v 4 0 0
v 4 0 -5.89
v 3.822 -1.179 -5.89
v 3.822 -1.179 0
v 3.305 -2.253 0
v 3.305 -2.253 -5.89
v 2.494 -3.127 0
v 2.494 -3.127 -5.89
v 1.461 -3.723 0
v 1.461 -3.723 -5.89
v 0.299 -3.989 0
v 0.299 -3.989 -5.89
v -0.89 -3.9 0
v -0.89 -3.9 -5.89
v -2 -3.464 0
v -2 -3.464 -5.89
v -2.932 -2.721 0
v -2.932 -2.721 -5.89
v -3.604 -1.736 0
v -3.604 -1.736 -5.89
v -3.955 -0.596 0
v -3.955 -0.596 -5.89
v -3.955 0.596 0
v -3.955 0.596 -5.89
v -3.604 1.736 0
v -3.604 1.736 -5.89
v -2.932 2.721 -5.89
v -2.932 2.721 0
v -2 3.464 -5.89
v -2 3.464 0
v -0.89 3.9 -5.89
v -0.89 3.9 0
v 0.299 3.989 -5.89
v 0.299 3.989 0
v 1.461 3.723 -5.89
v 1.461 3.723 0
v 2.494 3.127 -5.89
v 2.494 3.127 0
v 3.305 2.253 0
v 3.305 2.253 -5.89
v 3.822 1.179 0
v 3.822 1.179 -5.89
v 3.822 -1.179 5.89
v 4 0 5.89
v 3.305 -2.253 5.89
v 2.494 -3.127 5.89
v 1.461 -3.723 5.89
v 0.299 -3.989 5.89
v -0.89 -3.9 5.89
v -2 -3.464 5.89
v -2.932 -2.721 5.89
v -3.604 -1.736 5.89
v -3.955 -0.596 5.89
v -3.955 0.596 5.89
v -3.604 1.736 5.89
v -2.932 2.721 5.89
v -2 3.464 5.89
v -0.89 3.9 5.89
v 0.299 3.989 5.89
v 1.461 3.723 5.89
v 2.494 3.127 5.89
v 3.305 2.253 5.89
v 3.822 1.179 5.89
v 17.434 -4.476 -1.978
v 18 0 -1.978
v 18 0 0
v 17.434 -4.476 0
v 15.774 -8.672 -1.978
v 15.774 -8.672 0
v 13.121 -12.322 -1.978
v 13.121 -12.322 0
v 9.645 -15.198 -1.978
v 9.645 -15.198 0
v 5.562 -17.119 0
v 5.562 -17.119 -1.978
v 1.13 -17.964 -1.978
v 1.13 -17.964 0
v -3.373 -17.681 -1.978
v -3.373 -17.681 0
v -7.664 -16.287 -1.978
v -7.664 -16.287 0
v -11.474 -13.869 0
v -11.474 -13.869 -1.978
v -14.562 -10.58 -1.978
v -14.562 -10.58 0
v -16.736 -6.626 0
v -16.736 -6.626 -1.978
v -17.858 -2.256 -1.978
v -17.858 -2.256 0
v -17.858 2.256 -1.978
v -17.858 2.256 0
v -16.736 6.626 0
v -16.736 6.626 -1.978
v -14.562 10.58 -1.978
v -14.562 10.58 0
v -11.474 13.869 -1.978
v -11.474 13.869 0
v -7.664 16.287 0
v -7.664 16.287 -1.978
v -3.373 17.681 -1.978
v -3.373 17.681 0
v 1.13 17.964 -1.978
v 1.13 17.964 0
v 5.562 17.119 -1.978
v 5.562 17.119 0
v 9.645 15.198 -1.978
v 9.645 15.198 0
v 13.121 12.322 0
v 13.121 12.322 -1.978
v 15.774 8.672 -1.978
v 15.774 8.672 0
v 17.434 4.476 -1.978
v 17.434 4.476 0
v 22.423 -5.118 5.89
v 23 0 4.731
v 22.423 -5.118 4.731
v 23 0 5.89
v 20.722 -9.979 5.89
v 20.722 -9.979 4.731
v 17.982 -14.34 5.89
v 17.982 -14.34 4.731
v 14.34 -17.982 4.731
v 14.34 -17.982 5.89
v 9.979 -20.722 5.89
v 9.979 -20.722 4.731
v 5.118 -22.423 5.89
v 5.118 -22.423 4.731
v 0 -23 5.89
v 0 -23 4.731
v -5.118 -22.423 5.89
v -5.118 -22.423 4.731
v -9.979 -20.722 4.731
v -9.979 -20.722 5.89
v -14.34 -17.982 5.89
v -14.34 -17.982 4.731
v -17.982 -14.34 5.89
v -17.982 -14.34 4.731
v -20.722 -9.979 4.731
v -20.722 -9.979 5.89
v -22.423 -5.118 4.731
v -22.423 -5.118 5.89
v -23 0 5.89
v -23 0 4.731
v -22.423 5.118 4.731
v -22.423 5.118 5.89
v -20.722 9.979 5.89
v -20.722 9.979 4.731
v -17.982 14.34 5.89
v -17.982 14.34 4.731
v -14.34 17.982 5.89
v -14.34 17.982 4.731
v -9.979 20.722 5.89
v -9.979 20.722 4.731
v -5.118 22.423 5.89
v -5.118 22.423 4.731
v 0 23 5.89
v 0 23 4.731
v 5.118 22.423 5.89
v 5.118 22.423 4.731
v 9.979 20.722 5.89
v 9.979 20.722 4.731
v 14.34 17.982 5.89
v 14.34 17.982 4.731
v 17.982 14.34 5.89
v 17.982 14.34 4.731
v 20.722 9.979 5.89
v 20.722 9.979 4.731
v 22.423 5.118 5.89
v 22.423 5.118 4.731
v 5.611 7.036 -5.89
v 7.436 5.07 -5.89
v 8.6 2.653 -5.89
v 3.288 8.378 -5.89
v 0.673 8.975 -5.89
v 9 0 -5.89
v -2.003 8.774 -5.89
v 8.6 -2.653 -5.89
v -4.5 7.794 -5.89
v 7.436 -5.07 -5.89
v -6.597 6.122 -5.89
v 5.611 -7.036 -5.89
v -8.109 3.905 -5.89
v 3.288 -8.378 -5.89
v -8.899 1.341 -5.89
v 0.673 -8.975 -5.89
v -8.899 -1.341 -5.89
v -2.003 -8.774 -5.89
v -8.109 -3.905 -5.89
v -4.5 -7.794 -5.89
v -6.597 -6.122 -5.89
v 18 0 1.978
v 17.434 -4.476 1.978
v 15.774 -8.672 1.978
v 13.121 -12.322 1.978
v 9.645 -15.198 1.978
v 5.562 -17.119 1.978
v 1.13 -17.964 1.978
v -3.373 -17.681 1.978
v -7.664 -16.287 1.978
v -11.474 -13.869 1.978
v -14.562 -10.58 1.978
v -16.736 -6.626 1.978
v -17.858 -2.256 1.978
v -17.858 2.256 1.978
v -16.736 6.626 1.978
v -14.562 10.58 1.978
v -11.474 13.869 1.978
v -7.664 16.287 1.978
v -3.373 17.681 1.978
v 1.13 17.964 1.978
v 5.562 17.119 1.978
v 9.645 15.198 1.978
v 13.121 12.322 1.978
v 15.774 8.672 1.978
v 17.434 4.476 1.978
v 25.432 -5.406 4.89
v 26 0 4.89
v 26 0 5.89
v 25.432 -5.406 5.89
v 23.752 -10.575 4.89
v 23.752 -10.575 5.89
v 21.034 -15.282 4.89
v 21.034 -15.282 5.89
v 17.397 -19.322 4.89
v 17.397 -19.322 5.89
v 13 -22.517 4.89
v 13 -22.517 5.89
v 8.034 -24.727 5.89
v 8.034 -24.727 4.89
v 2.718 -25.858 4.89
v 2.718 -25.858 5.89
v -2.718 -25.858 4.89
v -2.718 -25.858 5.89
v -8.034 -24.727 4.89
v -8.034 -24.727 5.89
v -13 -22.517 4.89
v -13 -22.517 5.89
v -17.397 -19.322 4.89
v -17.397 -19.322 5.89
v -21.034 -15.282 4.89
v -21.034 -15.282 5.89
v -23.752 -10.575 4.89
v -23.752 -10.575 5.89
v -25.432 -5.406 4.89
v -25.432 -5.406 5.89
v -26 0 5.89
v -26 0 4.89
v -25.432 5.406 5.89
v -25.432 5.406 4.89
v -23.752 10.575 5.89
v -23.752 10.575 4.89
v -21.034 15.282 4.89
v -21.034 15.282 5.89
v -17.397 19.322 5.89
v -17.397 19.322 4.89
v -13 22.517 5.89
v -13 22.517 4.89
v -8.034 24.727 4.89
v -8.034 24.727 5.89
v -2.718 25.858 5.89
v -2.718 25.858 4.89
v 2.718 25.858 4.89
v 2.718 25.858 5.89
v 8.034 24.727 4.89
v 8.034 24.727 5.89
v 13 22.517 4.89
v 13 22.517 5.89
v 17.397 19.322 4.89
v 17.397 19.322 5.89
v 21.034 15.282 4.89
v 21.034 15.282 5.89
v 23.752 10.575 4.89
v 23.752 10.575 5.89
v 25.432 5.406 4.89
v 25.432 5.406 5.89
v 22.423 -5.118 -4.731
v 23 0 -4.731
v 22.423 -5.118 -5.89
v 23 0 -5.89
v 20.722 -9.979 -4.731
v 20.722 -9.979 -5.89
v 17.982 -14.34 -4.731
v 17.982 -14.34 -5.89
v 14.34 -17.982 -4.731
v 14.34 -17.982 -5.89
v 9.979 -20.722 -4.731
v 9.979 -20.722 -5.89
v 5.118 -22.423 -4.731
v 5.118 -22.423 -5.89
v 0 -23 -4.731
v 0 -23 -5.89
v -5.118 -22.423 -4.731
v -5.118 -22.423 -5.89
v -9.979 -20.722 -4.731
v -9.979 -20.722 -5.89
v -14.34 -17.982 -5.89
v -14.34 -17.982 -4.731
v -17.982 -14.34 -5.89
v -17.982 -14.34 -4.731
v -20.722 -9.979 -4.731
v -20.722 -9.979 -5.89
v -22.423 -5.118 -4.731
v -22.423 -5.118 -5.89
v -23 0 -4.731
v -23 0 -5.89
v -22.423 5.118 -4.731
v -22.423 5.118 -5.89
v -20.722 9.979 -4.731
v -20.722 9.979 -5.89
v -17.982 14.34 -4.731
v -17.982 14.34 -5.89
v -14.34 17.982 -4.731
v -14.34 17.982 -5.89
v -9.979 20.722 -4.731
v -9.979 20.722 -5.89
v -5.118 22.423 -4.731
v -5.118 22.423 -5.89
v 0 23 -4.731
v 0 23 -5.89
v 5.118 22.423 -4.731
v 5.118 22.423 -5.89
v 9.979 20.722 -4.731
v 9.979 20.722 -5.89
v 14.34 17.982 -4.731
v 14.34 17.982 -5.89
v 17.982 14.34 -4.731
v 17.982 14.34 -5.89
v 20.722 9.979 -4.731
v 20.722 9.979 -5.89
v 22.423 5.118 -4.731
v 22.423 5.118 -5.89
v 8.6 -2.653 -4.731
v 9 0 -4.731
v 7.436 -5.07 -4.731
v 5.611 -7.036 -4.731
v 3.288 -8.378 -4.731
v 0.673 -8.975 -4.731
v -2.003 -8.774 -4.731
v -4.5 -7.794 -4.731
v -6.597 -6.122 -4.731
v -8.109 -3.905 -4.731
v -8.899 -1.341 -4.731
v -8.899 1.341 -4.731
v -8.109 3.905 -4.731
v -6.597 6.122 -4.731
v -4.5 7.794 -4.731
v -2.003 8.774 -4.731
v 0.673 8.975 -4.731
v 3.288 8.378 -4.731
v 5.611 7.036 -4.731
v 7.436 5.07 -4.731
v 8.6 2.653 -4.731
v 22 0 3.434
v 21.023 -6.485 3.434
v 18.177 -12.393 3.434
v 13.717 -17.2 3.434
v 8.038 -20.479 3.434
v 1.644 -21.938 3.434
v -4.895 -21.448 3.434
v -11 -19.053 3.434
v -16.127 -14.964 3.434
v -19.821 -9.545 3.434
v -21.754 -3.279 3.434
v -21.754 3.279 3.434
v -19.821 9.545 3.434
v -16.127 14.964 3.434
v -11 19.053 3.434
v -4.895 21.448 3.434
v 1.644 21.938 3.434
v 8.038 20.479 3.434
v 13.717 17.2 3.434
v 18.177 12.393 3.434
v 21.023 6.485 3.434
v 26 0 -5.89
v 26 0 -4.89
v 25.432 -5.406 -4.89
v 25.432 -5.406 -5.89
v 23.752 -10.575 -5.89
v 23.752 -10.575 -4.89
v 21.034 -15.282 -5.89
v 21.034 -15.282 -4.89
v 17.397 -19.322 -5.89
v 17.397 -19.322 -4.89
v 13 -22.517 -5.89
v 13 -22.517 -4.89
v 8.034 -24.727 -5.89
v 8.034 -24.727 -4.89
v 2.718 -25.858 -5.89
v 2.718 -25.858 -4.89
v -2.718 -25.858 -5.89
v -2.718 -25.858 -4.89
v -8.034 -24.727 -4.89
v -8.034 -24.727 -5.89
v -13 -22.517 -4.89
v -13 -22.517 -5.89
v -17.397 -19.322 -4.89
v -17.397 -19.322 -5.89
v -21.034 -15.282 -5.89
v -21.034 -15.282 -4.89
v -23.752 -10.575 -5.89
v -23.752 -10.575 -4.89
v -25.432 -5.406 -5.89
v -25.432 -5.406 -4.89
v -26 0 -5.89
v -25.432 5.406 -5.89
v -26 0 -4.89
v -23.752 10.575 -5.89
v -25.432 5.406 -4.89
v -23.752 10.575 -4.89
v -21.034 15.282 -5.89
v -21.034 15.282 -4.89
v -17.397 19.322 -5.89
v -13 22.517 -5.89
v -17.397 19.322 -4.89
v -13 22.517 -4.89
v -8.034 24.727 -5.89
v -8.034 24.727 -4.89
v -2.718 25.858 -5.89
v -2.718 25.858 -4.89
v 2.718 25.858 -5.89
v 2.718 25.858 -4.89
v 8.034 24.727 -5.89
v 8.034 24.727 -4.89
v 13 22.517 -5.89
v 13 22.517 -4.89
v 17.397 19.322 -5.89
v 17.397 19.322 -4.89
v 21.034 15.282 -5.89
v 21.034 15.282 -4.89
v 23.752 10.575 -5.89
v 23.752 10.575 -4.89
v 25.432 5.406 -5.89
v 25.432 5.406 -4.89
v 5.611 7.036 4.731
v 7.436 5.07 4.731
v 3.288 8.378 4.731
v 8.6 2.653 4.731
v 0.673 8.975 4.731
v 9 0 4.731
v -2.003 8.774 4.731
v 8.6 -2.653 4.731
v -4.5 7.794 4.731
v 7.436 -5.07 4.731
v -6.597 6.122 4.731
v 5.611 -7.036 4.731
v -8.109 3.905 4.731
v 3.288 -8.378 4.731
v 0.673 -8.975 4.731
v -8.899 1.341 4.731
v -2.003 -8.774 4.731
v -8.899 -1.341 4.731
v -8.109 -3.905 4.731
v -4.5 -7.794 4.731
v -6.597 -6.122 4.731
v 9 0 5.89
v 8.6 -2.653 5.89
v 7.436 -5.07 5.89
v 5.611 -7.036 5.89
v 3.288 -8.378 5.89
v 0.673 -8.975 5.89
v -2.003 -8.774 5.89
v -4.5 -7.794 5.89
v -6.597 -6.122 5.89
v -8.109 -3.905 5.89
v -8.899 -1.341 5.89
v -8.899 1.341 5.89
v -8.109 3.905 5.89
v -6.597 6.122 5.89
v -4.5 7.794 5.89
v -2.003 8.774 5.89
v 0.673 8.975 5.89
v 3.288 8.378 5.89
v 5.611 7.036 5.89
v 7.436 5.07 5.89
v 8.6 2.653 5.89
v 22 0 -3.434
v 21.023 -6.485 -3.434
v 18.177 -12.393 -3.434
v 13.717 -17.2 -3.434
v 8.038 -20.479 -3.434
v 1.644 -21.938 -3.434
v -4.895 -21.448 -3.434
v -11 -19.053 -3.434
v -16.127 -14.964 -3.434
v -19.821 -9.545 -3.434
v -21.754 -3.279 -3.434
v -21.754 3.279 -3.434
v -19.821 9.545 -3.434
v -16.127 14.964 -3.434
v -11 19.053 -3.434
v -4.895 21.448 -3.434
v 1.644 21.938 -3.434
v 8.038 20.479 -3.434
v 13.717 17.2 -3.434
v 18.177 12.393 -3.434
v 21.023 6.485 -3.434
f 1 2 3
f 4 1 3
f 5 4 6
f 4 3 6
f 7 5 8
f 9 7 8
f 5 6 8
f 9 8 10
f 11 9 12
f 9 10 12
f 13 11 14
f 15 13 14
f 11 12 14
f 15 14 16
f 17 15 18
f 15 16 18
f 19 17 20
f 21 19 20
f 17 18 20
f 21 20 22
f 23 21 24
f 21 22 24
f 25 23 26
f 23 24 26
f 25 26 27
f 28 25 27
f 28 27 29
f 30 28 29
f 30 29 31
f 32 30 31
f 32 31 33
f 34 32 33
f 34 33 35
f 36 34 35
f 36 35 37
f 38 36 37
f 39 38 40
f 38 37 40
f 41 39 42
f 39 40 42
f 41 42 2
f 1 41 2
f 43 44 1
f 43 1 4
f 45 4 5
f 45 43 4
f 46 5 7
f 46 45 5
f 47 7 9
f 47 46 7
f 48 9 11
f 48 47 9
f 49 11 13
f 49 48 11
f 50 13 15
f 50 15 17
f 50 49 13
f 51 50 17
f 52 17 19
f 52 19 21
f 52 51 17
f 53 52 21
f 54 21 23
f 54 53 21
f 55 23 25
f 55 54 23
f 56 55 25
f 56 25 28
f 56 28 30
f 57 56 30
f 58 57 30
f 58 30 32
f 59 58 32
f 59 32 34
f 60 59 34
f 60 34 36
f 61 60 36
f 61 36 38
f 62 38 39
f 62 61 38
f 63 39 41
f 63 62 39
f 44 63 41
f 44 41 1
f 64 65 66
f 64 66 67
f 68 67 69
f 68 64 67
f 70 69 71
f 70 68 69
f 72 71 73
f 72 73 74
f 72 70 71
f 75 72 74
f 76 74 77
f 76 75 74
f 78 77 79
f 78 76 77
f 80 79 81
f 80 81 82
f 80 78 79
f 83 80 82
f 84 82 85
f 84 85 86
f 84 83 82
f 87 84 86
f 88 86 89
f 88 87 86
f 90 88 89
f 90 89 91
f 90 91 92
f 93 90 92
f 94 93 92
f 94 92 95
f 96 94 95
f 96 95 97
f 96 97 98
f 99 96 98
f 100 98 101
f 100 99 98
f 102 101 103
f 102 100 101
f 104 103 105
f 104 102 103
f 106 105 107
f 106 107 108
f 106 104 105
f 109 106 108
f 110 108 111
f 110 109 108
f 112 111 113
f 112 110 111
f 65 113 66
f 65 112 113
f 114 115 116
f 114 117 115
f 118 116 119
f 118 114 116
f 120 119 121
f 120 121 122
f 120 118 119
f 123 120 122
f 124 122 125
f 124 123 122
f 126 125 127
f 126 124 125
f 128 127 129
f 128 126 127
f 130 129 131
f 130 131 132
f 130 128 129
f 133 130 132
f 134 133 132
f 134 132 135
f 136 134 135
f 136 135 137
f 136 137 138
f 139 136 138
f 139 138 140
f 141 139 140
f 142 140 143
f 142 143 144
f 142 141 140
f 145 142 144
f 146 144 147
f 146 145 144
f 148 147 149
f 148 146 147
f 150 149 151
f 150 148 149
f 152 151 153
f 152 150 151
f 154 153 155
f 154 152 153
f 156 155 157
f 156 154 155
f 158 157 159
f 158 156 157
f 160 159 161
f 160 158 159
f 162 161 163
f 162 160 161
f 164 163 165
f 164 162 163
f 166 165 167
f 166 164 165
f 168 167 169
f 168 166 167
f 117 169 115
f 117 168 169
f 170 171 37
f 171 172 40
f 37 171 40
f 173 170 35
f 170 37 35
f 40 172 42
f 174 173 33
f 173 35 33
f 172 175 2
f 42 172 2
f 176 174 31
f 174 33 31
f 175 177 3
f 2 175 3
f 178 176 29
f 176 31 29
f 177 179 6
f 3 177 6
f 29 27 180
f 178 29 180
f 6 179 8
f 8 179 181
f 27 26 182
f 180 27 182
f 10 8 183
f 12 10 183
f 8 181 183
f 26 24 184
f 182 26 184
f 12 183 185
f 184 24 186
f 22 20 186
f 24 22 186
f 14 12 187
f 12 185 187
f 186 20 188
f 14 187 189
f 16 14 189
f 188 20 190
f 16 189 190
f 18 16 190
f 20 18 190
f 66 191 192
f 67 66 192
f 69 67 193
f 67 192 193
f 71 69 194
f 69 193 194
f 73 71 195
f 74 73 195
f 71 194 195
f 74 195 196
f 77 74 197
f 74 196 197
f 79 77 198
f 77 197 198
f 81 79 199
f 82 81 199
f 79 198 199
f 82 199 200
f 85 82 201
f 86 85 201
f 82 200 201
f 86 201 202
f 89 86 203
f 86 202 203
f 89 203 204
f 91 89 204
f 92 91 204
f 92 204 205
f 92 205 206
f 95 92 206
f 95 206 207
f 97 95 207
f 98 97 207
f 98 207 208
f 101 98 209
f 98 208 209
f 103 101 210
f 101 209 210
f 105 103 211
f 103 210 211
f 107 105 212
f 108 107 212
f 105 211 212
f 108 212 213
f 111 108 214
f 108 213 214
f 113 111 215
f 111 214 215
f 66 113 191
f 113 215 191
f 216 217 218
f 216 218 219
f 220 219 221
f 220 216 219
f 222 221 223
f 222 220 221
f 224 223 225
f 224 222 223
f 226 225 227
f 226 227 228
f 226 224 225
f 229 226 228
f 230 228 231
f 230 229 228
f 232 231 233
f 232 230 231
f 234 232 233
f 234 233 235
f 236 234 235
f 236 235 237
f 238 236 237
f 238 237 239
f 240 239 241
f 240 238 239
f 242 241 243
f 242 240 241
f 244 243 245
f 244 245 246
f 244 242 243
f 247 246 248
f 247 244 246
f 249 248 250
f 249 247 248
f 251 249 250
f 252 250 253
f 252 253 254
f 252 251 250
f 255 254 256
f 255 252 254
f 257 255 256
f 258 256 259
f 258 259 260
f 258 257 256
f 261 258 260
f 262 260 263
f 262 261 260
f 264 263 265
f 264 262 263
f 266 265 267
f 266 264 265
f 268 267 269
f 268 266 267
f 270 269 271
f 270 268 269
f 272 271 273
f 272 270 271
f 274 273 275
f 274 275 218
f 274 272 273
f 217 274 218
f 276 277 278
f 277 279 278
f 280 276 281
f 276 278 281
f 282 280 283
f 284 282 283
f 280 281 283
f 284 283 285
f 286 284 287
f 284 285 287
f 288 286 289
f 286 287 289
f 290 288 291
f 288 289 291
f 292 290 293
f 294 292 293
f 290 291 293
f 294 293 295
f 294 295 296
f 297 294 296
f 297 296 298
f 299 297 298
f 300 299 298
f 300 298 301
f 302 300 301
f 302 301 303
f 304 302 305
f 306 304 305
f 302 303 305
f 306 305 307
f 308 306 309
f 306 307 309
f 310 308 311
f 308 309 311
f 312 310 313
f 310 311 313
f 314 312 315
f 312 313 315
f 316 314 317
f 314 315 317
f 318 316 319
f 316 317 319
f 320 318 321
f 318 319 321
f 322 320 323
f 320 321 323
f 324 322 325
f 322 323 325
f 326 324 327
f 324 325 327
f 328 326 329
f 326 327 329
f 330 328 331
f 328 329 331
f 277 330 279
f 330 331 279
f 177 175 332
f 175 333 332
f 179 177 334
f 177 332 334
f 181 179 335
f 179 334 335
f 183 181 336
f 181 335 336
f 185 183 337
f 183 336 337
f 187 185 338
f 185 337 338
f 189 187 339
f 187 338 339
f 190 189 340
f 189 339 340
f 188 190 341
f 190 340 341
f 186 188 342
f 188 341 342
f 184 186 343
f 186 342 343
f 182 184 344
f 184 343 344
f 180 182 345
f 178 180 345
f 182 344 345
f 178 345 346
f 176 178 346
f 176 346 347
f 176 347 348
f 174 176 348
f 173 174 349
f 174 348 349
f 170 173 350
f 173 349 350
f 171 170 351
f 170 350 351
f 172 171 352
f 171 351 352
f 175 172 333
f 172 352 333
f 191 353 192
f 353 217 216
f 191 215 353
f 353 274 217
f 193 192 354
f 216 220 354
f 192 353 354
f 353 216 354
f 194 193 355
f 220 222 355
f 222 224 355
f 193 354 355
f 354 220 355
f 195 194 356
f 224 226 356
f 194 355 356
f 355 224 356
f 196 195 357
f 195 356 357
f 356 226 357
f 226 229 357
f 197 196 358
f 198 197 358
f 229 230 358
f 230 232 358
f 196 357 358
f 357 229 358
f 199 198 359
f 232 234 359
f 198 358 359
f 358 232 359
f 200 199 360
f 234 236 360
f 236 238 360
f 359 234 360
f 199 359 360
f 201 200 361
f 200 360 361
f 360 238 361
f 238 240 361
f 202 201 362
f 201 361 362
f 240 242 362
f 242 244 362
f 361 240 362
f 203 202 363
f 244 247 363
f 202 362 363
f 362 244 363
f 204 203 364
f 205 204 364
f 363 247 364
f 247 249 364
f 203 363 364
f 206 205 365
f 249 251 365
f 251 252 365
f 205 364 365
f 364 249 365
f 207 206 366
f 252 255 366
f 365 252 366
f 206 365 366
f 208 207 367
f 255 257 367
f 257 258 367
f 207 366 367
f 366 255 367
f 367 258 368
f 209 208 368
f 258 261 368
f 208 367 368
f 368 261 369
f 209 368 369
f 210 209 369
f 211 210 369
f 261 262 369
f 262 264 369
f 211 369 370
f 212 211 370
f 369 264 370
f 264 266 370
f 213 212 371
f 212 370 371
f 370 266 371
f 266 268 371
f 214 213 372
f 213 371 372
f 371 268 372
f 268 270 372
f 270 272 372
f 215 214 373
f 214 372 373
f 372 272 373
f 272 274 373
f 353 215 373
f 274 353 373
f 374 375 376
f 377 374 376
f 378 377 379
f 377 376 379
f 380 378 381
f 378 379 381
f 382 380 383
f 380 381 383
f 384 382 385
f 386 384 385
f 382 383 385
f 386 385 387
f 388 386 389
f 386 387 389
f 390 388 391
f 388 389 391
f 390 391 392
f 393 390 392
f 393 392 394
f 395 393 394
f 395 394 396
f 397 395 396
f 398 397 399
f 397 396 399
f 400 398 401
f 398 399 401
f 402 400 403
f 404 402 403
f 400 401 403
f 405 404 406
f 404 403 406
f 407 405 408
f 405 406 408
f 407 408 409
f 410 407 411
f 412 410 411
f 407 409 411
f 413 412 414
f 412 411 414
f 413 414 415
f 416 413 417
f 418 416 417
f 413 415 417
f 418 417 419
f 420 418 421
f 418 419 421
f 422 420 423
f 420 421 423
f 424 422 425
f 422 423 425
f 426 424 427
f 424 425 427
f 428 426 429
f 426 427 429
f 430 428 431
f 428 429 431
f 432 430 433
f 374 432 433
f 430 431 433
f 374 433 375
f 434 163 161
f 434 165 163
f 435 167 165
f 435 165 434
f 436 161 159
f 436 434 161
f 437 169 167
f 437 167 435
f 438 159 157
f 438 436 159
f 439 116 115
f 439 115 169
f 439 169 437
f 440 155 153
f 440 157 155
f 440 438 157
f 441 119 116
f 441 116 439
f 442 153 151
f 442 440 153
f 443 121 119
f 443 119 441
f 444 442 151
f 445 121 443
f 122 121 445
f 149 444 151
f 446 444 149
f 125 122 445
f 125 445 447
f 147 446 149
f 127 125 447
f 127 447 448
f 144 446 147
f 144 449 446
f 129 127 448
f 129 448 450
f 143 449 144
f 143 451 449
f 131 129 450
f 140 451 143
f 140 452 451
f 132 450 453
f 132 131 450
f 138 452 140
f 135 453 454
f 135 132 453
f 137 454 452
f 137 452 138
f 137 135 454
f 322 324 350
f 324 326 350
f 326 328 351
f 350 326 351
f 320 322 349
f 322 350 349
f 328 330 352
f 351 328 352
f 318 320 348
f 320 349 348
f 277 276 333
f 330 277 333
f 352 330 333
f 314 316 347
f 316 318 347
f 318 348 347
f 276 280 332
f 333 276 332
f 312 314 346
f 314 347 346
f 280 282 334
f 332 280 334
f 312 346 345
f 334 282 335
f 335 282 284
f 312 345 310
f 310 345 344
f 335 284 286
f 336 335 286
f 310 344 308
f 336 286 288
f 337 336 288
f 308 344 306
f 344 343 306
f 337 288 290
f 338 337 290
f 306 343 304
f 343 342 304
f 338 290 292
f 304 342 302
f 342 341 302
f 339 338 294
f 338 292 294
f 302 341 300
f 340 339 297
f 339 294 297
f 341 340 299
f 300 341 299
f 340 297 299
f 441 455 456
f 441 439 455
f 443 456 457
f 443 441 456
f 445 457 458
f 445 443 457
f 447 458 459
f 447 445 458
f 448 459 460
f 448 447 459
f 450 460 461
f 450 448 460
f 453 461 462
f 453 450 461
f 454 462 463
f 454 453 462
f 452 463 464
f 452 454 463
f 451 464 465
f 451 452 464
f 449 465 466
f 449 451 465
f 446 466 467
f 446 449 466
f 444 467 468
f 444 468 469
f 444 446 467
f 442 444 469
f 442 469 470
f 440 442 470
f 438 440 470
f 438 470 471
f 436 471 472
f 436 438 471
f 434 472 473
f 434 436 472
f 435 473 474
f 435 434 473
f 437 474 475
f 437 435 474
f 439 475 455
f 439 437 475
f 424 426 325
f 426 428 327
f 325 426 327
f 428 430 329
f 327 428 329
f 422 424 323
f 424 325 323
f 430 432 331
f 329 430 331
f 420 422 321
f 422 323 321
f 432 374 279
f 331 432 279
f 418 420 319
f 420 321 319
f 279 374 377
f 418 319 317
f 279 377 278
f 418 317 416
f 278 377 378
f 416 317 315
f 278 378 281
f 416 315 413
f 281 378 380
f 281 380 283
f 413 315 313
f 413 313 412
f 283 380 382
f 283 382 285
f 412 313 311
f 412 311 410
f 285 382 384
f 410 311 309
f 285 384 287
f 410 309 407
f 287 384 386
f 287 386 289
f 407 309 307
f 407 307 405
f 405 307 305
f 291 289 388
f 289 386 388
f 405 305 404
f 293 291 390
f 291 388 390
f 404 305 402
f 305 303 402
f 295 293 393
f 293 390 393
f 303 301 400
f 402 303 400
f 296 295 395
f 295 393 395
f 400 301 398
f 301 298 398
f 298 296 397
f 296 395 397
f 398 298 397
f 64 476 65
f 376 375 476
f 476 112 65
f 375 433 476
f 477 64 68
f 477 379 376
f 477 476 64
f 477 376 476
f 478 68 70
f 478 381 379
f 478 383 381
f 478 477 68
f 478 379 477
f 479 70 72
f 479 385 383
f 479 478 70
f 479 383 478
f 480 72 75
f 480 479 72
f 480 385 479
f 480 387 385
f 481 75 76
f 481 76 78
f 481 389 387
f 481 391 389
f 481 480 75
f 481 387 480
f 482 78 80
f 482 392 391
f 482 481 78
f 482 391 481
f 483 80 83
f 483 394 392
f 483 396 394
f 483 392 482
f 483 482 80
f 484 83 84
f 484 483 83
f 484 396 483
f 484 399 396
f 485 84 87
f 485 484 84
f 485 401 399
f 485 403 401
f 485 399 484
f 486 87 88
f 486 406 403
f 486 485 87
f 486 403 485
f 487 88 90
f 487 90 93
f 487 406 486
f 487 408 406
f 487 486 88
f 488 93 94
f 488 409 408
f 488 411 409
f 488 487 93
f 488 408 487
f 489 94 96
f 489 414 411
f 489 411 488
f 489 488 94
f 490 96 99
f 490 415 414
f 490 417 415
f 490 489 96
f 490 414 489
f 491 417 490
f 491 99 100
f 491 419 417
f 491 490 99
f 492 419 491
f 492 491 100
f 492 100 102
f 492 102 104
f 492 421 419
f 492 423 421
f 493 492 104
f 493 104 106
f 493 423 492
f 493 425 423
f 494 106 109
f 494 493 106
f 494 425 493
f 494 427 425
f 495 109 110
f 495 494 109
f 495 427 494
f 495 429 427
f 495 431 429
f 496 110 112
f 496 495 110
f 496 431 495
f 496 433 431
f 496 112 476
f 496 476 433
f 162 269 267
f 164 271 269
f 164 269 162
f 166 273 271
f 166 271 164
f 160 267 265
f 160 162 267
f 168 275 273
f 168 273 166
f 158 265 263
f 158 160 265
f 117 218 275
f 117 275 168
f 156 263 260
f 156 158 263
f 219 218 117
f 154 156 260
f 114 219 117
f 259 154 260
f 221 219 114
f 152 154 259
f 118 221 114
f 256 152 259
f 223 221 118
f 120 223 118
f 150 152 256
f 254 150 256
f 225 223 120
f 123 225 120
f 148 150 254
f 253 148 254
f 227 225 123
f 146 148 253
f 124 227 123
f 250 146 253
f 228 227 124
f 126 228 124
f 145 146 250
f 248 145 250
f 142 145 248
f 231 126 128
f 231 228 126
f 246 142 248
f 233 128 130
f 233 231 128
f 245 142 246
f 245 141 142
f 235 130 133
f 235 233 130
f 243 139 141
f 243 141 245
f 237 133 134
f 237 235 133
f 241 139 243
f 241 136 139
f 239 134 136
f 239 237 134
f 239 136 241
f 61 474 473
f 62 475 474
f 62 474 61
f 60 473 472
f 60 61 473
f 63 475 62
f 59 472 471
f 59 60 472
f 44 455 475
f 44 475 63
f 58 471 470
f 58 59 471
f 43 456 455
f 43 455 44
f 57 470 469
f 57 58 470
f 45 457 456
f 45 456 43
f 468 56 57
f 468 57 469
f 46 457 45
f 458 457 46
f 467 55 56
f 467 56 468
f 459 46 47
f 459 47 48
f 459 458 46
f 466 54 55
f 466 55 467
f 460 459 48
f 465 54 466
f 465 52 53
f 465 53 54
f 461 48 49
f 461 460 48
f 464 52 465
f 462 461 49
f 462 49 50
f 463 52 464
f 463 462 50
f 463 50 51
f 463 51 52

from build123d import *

# Parameters (mm, degrees)
BODY_MOVE_COPY1_ANGLE = 90


with BuildPart() as part:
    # Sketch1 → Revolve1 (revolve)
    with BuildSketch(Plane.XY, mode=Mode.PRIVATE) as revolve1_sk:
        Polygon((0, 4), (5.89, 4), (5.89, 9), (4.730911447, 9), (4.730911447, 23), (5.89, 23), (5.89, 26), (0, 26), align=None)
    revolve1 = revolve(revolve1_sk.sketch.rotate(Axis((0, 0, 0), (1, 0, 0)), 90), axis=Axis((0, 0, 0), (1, 0, 0)))

    # Sketch2 → Cut-Revolve1 (revolve, cut)
    with BuildSketch(Plane.XY, mode=Mode.PRIVATE) as cut_revolve1_sk:
        Polygon((0, 18), (1.977829822, 18), (4.889591697, 26), (0, 26), align=None)
    cut_revolve1 = revolve(cut_revolve1_sk.sketch.rotate(Axis((0, 0, 0), (1, 0, 0)), 90), axis=Axis((0, 0, 0), (1, 0, 0)), mode=Mode.SUBTRACT)

    # Mirror1: Revolve1, Cut-Revolve1 across Right Plane
    add(revolve1.mirror(Plane(origin=(0, 0, 0), x_dir=(0, 0, -1), z_dir=(1, 0, 0))))
    add(cut_revolve1.mirror(Plane(origin=(0, 0, 0), x_dir=(0, 0, -1), z_dir=(1, 0, 0))), mode=Mode.SUBTRACT)


with BuildPart() as part_1:
    # Body-Move/Copy1: moved
    add(part.part.rotate(Axis((0, 0, 0), (0, 1, 0)), BODY_MOVE_COPY1_ANGLE))


solid = part_1.part
